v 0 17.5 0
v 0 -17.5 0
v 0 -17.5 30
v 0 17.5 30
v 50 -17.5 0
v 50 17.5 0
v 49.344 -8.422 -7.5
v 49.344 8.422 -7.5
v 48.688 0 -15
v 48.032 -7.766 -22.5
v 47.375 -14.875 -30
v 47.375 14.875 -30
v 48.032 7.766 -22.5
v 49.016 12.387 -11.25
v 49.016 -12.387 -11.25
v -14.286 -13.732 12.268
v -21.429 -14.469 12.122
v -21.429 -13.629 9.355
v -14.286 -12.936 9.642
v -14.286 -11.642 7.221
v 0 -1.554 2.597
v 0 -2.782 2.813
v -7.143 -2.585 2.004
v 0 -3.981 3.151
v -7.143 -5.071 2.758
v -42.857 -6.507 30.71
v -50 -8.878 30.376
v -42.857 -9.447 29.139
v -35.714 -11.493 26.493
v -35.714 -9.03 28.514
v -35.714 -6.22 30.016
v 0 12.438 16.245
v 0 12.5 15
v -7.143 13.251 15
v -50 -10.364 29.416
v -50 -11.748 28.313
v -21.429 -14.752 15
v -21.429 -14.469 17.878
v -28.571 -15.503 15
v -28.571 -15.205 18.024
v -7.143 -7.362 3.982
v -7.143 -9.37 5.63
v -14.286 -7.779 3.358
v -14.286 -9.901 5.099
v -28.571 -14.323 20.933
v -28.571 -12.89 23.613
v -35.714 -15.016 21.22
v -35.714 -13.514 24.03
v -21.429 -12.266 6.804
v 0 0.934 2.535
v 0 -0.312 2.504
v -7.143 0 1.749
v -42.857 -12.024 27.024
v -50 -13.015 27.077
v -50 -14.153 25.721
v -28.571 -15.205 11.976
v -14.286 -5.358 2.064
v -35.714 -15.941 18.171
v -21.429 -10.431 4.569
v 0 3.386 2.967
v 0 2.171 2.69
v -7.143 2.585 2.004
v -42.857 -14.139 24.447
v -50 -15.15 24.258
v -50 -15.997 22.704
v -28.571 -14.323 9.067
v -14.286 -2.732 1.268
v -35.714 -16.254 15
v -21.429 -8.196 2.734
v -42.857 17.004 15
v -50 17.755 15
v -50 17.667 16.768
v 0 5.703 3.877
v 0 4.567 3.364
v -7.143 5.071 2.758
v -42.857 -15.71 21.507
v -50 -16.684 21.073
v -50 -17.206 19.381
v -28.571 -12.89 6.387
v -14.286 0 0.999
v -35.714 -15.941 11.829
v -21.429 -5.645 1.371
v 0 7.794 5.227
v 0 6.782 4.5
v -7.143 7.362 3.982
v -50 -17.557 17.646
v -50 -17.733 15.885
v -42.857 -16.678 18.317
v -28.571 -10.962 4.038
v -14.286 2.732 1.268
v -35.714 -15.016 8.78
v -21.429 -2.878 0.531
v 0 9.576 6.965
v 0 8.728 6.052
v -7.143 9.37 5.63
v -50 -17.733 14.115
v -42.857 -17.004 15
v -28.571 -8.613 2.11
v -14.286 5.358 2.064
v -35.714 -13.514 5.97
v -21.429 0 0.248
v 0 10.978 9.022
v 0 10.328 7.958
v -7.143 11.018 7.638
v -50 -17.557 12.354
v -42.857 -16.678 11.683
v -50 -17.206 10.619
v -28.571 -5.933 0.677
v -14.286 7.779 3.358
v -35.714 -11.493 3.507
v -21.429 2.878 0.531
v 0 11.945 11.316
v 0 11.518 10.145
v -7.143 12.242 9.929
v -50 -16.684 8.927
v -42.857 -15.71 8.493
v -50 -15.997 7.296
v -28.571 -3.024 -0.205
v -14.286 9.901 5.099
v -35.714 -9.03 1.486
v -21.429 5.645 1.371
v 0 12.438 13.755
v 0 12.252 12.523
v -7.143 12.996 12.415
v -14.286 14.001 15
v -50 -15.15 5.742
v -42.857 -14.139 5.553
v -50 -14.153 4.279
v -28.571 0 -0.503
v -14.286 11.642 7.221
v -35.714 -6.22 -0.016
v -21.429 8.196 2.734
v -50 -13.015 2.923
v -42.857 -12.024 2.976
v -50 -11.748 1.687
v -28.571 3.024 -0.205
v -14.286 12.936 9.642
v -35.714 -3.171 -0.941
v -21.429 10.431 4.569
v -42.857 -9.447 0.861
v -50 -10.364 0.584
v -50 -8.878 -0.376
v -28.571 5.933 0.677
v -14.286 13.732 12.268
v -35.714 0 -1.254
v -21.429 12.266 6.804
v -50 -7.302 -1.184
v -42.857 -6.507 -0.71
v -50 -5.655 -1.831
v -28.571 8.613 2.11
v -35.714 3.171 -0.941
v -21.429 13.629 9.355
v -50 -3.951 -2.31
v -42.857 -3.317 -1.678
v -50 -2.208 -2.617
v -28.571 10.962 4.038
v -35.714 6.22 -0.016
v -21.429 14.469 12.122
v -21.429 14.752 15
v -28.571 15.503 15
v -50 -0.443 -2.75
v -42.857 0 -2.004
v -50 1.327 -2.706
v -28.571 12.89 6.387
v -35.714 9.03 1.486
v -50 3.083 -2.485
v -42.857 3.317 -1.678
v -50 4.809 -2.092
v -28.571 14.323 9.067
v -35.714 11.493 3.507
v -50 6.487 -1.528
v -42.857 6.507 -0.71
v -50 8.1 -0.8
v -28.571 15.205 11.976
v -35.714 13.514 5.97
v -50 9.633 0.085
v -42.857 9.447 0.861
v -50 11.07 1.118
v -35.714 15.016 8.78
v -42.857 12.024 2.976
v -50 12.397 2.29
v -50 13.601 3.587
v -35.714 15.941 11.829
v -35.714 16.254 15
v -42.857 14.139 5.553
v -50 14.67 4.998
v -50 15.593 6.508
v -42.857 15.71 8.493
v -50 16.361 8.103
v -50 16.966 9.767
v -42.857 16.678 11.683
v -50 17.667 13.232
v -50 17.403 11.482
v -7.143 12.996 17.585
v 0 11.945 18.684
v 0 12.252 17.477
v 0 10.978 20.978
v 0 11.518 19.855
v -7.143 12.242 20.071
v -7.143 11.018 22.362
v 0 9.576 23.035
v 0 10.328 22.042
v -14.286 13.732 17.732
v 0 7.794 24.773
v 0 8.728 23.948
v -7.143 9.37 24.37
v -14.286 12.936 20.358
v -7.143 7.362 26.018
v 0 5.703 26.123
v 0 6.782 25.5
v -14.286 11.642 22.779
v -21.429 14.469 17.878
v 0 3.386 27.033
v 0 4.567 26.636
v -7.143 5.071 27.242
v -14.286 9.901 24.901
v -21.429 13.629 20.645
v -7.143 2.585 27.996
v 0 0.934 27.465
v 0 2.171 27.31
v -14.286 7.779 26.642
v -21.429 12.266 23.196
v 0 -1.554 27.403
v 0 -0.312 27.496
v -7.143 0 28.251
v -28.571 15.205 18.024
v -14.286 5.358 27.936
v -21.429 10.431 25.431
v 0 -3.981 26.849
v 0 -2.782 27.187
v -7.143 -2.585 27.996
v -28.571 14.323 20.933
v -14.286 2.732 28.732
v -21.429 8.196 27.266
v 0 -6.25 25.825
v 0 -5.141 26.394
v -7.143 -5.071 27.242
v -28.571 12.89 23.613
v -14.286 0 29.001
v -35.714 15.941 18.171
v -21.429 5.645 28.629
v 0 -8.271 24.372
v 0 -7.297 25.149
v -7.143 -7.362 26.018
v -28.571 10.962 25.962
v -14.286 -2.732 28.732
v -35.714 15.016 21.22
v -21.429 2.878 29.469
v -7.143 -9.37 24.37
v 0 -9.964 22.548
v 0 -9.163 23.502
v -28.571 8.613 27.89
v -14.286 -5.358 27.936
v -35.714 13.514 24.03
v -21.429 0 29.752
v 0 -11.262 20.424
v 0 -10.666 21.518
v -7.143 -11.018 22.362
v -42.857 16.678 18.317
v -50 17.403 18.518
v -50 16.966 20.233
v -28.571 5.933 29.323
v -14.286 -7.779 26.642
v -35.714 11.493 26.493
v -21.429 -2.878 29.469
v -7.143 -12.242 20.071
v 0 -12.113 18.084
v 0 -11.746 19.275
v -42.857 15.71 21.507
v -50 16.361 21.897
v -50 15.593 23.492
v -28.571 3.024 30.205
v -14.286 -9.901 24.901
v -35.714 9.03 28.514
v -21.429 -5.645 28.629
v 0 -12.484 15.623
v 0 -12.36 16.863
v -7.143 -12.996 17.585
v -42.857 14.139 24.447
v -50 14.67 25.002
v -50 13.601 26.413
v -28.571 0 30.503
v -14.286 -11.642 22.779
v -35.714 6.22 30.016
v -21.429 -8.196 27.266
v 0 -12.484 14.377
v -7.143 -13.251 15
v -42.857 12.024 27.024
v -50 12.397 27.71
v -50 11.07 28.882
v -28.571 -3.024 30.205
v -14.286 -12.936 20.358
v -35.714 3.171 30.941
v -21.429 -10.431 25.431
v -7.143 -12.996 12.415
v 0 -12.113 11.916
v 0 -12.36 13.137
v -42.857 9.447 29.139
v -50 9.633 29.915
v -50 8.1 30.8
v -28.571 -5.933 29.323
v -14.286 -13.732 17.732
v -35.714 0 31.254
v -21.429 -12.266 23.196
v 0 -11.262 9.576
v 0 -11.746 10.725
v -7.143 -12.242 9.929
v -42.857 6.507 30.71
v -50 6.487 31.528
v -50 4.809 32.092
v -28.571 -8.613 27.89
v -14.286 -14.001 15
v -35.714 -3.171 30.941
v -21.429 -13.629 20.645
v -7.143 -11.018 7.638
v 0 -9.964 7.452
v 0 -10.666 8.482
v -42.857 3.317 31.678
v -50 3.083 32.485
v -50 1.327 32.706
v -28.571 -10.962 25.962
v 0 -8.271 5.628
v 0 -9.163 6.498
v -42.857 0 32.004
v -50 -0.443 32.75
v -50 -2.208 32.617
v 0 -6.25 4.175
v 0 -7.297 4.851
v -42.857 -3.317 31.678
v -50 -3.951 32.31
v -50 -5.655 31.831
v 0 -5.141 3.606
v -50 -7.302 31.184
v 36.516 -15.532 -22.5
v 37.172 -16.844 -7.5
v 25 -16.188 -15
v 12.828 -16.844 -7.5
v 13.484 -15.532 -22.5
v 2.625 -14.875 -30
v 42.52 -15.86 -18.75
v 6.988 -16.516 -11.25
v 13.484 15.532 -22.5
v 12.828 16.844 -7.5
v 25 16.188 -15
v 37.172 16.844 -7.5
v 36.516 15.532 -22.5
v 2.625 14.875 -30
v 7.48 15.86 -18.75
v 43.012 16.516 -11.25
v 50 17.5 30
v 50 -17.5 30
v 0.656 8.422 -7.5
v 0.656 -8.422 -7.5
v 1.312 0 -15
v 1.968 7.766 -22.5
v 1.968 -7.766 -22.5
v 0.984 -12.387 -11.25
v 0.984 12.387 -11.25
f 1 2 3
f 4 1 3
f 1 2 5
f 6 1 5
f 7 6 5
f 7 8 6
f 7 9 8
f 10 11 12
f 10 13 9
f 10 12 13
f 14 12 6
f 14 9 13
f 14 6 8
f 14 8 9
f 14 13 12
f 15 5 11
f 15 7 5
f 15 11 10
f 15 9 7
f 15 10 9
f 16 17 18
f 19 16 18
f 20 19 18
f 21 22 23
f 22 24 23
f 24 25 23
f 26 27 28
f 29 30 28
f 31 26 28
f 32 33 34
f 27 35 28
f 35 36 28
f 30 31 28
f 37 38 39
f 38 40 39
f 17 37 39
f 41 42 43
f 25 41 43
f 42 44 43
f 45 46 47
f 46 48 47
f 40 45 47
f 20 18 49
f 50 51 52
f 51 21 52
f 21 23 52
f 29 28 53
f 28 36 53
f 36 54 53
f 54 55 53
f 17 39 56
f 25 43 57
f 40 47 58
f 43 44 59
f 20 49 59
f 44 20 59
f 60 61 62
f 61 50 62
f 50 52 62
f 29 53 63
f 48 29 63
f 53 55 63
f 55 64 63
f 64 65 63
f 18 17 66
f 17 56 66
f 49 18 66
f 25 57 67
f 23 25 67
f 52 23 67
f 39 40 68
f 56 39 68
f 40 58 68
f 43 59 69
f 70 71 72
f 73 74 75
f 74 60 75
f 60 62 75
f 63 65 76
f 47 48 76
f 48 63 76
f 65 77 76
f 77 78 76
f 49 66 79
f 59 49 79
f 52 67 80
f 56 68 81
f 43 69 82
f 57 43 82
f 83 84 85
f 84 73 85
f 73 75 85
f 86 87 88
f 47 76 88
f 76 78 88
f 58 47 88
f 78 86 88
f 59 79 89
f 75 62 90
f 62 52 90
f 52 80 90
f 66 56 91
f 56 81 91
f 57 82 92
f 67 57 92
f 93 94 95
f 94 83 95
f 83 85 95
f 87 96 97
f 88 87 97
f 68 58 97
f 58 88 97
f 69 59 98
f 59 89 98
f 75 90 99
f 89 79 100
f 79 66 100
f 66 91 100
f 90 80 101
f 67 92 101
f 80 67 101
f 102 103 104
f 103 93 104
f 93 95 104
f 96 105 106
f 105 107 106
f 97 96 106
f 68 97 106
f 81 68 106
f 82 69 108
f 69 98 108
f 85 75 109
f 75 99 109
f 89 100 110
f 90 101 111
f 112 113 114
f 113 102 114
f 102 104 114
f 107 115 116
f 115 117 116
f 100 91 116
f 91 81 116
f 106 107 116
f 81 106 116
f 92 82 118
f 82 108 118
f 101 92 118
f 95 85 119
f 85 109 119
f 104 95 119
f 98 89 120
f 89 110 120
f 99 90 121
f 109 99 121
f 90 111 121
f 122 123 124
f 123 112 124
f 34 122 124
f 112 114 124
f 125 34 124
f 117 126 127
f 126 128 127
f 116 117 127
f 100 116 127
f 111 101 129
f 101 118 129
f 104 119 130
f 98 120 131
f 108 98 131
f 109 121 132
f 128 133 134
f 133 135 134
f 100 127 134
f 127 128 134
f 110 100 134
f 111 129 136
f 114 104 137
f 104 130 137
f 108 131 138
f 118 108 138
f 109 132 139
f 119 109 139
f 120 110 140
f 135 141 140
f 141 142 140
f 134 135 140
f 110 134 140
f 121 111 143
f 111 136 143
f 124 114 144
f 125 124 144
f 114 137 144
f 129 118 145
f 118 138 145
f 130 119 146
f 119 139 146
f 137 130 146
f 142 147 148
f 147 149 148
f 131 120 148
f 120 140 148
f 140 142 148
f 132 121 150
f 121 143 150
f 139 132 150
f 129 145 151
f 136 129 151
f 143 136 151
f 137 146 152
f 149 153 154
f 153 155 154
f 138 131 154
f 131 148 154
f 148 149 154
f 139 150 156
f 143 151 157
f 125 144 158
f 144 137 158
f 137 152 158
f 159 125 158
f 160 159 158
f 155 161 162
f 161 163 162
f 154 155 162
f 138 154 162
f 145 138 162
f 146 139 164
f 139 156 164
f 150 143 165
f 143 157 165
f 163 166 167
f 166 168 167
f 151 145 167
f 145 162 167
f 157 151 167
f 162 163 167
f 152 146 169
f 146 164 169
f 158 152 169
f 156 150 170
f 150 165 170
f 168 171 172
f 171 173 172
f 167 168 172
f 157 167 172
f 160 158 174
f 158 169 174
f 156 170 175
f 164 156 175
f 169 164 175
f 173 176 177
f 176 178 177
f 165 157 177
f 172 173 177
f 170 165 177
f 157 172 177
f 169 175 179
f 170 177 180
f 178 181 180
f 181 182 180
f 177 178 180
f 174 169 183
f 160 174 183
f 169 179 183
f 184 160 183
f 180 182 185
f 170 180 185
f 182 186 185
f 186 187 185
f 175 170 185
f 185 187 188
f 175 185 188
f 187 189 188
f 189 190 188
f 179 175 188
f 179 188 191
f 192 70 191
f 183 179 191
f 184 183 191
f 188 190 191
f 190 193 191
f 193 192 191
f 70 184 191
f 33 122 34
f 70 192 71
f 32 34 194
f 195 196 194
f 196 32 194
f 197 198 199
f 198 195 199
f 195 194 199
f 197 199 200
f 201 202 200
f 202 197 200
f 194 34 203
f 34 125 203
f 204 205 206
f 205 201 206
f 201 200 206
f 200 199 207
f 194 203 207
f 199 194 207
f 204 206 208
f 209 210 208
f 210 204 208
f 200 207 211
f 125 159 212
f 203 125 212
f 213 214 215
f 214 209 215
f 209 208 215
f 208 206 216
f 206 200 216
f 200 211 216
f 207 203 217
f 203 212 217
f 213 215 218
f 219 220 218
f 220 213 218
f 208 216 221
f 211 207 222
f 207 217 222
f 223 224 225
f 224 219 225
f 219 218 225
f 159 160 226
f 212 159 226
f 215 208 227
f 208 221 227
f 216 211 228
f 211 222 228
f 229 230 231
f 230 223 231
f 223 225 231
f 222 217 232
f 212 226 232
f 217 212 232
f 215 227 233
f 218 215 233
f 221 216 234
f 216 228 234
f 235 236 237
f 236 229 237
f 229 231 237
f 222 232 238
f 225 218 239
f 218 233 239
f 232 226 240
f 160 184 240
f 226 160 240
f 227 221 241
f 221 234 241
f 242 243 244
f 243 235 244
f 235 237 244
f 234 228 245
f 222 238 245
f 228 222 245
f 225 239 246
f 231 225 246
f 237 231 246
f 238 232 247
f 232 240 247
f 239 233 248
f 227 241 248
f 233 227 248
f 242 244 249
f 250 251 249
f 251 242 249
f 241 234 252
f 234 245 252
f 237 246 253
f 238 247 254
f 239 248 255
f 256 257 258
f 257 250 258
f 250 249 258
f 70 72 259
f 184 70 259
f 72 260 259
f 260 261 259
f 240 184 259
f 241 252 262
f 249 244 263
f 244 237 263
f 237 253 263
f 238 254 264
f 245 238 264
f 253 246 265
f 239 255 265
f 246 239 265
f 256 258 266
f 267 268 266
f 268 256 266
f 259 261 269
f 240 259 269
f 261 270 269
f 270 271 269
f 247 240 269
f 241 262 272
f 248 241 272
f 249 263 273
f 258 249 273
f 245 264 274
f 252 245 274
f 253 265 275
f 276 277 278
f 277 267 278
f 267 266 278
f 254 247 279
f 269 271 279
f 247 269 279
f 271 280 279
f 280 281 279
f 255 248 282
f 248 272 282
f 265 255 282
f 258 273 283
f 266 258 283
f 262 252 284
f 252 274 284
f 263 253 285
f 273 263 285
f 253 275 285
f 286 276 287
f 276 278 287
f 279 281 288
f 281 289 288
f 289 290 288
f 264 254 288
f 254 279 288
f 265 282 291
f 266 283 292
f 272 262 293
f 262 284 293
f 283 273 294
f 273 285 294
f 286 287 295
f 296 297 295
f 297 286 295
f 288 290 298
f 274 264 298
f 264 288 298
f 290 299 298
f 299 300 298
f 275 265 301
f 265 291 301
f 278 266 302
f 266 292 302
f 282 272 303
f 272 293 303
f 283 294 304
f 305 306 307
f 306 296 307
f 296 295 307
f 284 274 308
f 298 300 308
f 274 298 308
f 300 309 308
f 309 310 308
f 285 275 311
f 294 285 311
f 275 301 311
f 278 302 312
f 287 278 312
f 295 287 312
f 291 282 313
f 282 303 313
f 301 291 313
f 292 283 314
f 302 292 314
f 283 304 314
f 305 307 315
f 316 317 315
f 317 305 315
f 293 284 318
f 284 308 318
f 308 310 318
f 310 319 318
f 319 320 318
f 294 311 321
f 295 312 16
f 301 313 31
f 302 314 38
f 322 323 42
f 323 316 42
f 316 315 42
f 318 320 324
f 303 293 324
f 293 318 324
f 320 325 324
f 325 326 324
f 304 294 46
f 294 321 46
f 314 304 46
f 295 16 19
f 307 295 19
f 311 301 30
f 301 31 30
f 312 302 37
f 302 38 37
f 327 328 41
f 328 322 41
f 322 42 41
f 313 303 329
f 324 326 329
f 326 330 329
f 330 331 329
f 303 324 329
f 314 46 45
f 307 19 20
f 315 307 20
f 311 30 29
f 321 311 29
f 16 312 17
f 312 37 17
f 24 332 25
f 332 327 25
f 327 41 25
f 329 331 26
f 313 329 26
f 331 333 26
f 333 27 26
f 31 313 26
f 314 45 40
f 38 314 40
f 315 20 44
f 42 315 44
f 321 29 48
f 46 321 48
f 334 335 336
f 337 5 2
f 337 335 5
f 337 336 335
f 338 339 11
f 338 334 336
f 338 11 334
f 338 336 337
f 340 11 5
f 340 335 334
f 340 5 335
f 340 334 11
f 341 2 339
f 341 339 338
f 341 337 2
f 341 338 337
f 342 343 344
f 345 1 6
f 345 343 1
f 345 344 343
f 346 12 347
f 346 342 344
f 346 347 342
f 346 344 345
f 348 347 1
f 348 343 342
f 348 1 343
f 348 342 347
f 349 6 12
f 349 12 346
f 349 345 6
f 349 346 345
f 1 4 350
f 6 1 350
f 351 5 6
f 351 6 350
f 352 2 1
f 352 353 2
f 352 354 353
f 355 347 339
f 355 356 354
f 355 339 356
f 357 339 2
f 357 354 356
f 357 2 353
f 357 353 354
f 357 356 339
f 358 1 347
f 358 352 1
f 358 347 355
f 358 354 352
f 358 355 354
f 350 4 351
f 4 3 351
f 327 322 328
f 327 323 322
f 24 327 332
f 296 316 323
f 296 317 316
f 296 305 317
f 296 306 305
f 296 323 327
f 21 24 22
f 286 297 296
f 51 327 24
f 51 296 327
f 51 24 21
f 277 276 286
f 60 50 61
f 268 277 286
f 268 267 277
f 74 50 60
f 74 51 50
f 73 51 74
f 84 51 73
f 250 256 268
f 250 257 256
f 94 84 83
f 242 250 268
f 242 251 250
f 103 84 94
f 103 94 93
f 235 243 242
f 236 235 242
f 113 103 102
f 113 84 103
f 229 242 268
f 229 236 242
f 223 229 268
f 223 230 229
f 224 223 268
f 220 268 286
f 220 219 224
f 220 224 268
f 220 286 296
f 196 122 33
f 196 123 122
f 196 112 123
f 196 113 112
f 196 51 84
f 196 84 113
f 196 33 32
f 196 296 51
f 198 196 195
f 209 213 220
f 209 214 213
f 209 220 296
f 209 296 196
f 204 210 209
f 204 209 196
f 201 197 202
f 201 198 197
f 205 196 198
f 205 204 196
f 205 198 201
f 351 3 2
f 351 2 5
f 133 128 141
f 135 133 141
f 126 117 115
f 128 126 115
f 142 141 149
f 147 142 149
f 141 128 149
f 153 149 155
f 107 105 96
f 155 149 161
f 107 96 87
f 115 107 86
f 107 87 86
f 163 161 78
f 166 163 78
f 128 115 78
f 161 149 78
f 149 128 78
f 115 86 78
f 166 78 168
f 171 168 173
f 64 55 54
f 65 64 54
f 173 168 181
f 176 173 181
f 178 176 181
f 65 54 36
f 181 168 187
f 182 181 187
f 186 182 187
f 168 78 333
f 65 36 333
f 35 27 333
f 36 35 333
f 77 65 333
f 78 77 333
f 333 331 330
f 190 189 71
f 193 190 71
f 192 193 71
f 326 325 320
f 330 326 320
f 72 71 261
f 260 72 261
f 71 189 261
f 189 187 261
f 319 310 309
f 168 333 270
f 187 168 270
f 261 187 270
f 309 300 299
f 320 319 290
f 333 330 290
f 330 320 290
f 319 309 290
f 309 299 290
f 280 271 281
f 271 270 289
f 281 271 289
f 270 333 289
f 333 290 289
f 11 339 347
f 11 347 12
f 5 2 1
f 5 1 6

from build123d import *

# Parameters (mm, degrees)
F0_W      = 50
F0_H      = 30
F1_DEPTH  = 17.5
F1_FACE_W = 50
F1_FACE_H = 35
F2_DEPTH  = 30
F2_TAPER  = 5
F3_R      = 12.5
F4_DEPTH  = 50
F4_TAPER  = -6


with BuildPart() as f1:
    # F0 (on Front) → F1 (new body, symmetric)
    with BuildSketch(Plane.XZ):
        with Locations((25, 15)):
            Rectangle(F0_W, F0_H)
    extrude(amount=F1_DEPTH, both=True)


with BuildPart() as f2:
    # F1_face (on face) → F2 (new body)
    with BuildSketch(Plane(origin=(25, 0, 0), x_dir=(1, 0, 0), z_dir=(0, 0, -1))):
        Rectangle(F1_FACE_W, F1_FACE_H)
    extrude(amount=F2_DEPTH, taper=F2_TAPER)


with BuildPart() as f4:
    # F3 (on Right) → F4 (new body)
    with BuildSketch(Plane.YZ):
        with Locations((0, 15)):
            Circle(F3_R)
    extrude(amount=-F4_DEPTH, taper=F4_TAPER)


solid = Compound([f1.part, f2.part, f4.part])
